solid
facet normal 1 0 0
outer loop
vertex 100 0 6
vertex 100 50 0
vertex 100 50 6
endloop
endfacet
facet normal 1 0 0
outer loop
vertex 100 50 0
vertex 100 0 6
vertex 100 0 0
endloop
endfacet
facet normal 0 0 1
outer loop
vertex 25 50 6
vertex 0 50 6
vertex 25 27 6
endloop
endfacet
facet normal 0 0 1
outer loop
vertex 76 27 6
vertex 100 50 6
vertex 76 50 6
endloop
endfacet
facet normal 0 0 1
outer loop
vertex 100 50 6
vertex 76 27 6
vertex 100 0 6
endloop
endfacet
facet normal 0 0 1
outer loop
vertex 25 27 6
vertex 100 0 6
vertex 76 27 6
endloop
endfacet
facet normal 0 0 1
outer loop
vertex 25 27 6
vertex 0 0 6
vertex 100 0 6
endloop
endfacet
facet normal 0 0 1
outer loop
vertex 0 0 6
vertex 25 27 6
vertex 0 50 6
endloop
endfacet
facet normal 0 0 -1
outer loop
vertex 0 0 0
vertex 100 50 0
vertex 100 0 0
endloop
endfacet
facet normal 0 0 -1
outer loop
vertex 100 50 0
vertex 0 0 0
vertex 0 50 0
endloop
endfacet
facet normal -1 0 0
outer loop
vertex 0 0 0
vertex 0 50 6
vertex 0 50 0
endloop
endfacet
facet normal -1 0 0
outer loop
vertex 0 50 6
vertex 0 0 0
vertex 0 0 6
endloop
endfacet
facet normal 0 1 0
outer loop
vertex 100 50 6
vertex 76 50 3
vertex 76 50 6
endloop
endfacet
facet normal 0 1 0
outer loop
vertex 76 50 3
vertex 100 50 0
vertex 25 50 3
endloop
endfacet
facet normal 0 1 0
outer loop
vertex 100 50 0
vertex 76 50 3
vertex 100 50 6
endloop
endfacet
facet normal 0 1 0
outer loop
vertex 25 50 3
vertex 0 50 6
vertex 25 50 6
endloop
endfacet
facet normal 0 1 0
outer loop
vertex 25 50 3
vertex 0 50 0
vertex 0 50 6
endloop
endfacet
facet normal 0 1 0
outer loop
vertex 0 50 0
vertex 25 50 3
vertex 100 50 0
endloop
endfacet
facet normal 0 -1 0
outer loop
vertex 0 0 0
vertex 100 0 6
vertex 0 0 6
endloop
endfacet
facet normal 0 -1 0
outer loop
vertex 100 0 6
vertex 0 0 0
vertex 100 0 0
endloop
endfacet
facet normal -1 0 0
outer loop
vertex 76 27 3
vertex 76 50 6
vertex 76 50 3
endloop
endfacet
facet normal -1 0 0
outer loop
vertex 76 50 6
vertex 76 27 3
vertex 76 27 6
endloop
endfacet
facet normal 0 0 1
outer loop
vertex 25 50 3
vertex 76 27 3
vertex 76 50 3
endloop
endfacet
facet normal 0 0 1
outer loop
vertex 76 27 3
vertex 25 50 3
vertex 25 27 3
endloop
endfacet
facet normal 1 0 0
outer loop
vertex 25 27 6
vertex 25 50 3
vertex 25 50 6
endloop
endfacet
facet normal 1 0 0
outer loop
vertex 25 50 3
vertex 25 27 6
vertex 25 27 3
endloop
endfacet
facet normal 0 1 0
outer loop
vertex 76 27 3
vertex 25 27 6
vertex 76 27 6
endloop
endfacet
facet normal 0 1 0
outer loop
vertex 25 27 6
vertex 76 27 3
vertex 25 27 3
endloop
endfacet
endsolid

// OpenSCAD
//cutting-aid HU glass-filter 3 mm
//glass cutter width???

difference() {
 cube([100, 50, 6]);
 translate([25, 27, 3]) cube([51, 50, 4]);    
}
